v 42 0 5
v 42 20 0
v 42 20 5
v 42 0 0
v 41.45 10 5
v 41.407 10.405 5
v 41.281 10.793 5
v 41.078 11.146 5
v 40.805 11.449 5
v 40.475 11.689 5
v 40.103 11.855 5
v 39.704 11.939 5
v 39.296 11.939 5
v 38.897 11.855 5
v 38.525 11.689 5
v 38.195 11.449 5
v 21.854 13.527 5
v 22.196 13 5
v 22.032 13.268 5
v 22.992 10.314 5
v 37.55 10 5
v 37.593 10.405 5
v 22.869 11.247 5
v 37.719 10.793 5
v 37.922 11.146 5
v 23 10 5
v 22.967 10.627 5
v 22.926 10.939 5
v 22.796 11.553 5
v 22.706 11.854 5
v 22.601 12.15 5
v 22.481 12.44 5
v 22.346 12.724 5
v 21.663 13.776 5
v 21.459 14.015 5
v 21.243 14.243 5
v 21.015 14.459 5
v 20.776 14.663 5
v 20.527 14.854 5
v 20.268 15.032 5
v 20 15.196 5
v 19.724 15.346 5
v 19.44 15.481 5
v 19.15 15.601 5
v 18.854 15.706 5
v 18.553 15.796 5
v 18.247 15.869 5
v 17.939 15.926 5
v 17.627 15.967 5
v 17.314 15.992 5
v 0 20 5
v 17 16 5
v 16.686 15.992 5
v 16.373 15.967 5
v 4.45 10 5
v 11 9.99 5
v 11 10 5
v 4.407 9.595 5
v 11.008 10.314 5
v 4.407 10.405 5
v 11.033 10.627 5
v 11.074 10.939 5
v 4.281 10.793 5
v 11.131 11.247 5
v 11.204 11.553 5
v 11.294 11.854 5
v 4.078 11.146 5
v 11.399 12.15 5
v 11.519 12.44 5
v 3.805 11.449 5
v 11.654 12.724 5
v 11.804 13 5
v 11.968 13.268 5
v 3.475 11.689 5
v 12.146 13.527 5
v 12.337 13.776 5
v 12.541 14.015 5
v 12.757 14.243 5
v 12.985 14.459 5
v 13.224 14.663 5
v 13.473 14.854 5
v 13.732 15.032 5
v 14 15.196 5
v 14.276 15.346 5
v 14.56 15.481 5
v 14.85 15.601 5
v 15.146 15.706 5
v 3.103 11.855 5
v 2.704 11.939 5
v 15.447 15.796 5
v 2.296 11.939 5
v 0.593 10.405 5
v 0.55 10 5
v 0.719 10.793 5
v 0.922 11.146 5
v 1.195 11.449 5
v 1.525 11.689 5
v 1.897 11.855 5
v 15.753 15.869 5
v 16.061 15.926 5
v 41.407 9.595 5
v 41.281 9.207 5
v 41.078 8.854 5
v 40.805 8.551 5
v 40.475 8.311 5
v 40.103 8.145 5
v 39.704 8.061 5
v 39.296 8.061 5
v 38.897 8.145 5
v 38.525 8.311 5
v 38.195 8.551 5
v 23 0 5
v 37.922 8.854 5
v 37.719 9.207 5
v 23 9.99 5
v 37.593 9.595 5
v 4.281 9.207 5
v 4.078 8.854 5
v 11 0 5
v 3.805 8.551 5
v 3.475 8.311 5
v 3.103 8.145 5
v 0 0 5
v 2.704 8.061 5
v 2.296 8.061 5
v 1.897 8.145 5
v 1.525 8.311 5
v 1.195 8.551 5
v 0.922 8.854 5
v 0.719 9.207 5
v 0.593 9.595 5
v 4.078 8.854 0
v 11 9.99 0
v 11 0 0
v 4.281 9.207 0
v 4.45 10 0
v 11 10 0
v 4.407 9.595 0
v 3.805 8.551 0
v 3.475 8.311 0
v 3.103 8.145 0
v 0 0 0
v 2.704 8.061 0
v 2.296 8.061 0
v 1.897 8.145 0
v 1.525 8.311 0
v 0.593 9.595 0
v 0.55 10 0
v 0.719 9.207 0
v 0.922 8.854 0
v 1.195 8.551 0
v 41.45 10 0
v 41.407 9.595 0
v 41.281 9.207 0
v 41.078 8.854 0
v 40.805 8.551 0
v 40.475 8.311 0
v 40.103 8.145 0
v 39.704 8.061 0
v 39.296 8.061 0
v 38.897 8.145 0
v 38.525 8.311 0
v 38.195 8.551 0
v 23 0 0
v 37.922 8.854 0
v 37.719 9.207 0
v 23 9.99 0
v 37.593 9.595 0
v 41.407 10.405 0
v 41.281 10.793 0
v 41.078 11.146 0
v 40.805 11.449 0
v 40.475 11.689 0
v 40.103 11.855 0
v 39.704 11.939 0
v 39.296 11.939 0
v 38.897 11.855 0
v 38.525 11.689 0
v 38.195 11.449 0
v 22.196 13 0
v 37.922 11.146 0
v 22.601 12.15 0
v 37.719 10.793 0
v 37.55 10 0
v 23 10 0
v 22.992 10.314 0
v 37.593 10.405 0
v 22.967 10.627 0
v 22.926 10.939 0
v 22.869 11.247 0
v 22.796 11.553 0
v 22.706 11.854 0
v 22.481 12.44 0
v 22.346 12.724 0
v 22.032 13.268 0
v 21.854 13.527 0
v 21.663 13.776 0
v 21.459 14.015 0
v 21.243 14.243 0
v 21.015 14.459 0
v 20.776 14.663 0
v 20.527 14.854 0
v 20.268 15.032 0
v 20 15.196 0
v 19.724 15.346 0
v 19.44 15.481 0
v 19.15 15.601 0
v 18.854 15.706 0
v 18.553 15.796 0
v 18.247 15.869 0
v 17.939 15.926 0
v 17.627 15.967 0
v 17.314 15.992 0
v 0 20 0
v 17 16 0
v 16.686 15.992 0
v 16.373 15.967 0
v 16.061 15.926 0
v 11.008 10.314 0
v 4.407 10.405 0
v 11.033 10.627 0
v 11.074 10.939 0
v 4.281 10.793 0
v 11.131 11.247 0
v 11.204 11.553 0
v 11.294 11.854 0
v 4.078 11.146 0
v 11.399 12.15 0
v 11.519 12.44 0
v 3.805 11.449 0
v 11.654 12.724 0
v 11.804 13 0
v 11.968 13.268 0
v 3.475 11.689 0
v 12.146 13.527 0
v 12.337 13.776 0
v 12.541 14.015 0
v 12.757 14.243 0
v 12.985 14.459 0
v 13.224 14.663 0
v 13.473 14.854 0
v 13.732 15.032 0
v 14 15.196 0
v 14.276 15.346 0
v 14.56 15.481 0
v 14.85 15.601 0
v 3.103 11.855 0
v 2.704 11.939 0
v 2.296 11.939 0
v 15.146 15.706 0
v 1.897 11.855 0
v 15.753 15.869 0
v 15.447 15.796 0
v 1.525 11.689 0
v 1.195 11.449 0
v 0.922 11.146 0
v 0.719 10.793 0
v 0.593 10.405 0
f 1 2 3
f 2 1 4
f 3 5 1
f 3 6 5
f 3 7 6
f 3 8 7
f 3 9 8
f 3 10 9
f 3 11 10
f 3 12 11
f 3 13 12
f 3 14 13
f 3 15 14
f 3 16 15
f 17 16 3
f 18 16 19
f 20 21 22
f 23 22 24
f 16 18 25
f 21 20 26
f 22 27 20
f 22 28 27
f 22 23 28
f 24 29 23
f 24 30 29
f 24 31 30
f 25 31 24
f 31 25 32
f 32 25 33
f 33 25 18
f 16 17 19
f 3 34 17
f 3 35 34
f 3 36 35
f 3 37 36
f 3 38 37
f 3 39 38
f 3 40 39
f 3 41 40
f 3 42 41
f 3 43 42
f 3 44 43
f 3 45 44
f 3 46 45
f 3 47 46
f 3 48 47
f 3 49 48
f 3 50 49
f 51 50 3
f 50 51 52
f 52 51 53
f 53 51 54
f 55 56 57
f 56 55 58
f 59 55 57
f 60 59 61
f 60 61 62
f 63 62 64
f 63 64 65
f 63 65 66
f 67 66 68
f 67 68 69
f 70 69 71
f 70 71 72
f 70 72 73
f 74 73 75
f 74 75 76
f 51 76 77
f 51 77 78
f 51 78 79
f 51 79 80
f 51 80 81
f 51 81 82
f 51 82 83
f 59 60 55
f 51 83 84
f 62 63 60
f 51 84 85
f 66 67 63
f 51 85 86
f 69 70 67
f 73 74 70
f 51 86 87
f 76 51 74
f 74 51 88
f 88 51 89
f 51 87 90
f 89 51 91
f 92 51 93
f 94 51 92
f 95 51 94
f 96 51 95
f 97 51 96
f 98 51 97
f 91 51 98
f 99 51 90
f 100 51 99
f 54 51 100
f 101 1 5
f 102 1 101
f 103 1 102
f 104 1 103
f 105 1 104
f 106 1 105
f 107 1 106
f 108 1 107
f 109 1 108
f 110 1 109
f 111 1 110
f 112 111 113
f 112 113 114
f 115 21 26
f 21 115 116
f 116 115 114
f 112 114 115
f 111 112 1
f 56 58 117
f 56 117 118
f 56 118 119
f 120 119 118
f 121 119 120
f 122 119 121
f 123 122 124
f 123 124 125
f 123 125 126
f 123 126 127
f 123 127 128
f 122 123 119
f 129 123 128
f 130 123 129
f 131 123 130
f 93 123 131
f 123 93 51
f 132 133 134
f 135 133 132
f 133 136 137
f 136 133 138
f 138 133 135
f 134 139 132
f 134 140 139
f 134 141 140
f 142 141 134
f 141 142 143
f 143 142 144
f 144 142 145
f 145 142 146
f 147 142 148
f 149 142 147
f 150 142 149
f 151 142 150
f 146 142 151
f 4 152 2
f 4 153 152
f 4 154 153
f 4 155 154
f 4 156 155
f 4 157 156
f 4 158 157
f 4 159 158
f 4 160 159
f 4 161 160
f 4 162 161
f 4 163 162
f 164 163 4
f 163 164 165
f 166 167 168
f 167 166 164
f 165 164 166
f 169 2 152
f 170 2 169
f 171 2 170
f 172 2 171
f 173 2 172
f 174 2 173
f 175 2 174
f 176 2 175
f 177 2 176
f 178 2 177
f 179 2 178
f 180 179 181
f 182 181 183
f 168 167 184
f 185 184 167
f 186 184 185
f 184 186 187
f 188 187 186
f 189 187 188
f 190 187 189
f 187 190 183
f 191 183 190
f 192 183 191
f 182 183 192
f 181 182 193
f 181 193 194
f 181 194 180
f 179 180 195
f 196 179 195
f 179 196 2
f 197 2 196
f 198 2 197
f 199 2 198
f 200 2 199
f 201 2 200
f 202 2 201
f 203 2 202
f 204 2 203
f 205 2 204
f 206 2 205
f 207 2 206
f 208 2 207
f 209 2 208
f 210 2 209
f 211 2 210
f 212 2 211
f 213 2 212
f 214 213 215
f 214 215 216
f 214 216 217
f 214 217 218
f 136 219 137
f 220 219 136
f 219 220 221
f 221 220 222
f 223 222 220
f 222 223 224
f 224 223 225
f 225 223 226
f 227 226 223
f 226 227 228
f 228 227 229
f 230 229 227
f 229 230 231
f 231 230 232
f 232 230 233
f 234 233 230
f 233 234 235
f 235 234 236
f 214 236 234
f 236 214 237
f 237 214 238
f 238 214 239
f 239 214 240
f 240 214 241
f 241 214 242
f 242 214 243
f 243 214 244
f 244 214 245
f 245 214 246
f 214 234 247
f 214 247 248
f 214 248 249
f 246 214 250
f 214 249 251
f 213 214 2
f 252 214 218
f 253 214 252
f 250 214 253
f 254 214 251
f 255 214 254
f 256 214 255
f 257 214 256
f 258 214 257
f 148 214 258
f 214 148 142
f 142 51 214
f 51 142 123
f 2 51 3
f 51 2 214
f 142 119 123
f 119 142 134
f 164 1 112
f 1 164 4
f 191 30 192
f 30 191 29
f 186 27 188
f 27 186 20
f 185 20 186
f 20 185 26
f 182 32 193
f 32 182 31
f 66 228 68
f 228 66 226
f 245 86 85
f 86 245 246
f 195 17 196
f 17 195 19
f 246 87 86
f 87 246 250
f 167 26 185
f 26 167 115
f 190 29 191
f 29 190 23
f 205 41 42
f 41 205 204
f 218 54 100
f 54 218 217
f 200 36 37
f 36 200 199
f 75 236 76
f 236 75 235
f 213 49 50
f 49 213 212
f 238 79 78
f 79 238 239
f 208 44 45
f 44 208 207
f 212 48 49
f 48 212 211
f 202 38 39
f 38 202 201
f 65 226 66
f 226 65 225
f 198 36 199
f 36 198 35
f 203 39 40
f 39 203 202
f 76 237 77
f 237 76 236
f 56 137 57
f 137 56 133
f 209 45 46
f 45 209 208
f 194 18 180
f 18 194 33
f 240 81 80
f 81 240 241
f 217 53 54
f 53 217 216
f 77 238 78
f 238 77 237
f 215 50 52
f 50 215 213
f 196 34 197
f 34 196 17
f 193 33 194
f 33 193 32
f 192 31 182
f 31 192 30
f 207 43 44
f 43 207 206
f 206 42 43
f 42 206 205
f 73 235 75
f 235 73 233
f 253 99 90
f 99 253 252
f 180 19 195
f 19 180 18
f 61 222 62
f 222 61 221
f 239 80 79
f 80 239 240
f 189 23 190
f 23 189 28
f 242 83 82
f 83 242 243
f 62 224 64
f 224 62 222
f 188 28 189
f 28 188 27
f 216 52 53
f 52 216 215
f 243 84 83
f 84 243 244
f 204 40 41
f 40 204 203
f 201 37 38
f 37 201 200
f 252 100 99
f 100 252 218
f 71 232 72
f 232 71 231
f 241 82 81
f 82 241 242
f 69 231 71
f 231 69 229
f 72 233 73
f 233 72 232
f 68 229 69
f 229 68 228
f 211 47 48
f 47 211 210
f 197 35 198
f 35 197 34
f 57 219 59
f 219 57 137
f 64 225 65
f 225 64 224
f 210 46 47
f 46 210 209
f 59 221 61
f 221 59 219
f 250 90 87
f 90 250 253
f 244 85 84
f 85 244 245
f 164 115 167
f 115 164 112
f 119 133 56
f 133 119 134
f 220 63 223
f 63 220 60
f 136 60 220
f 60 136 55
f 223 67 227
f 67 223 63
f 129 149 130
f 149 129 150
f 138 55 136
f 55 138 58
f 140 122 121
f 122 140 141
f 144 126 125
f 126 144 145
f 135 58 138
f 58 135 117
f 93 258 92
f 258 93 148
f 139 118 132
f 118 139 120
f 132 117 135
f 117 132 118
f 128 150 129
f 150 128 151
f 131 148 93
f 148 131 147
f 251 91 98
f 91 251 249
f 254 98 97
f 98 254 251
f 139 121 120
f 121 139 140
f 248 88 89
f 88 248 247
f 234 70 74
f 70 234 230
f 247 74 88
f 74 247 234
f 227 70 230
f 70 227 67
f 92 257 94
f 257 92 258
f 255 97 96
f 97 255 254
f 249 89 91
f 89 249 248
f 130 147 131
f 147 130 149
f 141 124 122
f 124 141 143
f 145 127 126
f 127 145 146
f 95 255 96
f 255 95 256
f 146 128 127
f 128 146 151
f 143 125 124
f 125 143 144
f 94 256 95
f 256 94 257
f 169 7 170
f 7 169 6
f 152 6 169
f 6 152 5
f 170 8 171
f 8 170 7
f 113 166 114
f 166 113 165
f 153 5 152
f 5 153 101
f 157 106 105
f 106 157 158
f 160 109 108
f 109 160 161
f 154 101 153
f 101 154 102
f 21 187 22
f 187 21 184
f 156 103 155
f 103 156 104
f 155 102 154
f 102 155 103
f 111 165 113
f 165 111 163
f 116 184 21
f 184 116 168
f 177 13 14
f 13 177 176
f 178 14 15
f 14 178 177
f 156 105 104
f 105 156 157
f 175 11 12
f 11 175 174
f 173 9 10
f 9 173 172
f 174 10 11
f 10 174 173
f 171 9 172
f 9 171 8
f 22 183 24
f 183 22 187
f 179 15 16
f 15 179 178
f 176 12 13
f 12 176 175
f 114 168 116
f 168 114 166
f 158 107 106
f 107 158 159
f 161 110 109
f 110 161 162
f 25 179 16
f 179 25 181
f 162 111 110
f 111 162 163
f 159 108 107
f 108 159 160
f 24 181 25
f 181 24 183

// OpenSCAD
mxy=42; //motor xy
msxy=31; //motor screw xy
msd=3; //motor screw diameter
msh=21; //motor screw height
mhubd=22.5; // motor hub diameter
mhubh=2.7; //motor hub height

ss=1.3; //screw hole slop
stp=0.9; // screw thread percent

gd=8; //gear diameter
gh=15; //gear height this is 14, but adding 1mm for extra space
gad=3; // gear axel diamter
gah=20; // gear axel height
gfo=3;
ty=mxy/2-gd/2; //top y
tshx=mxy/2-mhubd/2; //top spring holder x
tz=12; //top z
tshz=tz-mhubh; //top spring holder z

by=20;
bz=mxy/2-((gd/2)*1.5);
bx=mxy;

hx=20; // handle thickness
hy=70; // handle length
hfd=3;
hgab=2; //handle gear axel border
fhd=3; // filament hole diameter
hz=mxy/2+gad/2+hgab;
springd=8;
springdepth=4;
springoffset=mxy-(mxy-(msxy+msd));

jheadod=16;
jheadsd=12;
jheadh=3.6;
jhsx=2.5;
jhsy=10;
jhsd=3;
jhsh=13;

ftd=4; //filament tube diameter
fmd=10; //filament motor distance(filament center to motor

fthd=7; //filament tube holder diameter

spacerd=10;
spacerh=5;

pt=5; //plate thickness


module extruder_handle(){
    difference(){
        cube([hx,hy,hz]);
       //gear hole
        translate([(hx-gh)/2,mxy/2-gd,mxy/2]){
            rotate([0,90,0]){
                cylinder(d=gd*1.5,h=gh);
            }
        }
        //gear axel hole
        translate([0,mxy/2-gd,mxy/2]){
            rotate([0,90,0]){
                cylinder(d=gad,h=gah,$fn=10);
            }
        }
        // clear handle
        translate([-1,(mxy/2)-(gd-(gad/2))+hgab,mxy/2-mhubd/2]){
            cube([hx+2,hy-(mxy/2)+gd-(gad/2)-hgab,hz-(mxy/2-mhubd/2)]);
        }
        //filament
        translate([hx-(hx/2-gh/2+3),mxy/2-gd/2,-1]){
            cylinder(d=fhd,h=hy+2,$fn=30);
        }
        //screw hole
        translate([-1,mxy/2-msxy/2,mxy/2-msxy/2]){
            rotate([0,90,0]){
                cylinder(d=msd*ss,h=hx+2,$fn=30);
            }
        }
        //spring detent
        translate([hx/2,springoffset,mxy/2-mhubd/2-springdepth]){
            cylinder(d=springd,h=springdepth+1,$fn=30);
        }
    }
}
module extruder_top(){
    difference(){
        translate([0,mxy-ty,0]){
            cube([mxy,ty,tz]);
        }
        //remove hub
        translate([mxy/2,mxy/2,0]){
            cylinder(d=mhubd,h=mhubh,$fn=90);
        }
        //top left screw
        translate([mxy/2-msxy/2,mxy/2+msxy/2,0]){
            cylinder(d=msd*ss,h=msh,$fn=30);
        }
        //top right screw
        translate([mxy/2+msxy/2,mxy/2+msxy/2,0]){
            cylinder(d=msd*ss,h=msh,$fn=30);
        }
        //remove majority of top
        translate([0,mxy-ty,mhubh]){
            cube([mxy-tshx,ty,tz]);
        }
    }
}
module extruder_bottom(){
    difference(){
        cube([bx,by,bz]);
        //remove hub
        translate([mxy/2,mxy/2,bz-mhubh]){
            rotate([90,0,0]){
                cylinder(d=mhubd,h=mhubh,$fn=90);
            }
        }
        //bottom motor left screw
        translate([mxy/2-msxy/2,-1,mxy/2-msxy/2]){
            rotate([-90,0,0]){
                cylinder(d=msd*ss,h=by+2,$fn=30);
            }
        }
        //bottom motor right screw
        translate([mxy/2+msxy/2,-1,mxy/2-msxy/2]){
            rotate([-90,0,0]){
                cylinder(d=msd*ss,h=by+2,$fn=30);
            }
        }
        //remove jhead
        translate([mxy/2-gd/2,fmd,-0.01]){
            cylinder(d=jheadod*1.01,h=jheadh,$fn=120);
        }
        //remove jhead tube holder
        translate([mxy/2-gd/2,fmd,-0.01]){
            cylinder(d=fthd,h=jheadh+3,$fn=120);
        }
        //remove jhead tube
        translate([mxy/2-gd/2,fmd,-0.01]){
            cylinder(d=ftd,h=bz+2,$fn=120);
        }
        //spring detent
        translate([springoffset,by/2-spacerh,bz-springdepth+1]){
            cylinder(d=springd,h=springdepth,$fn=30);
        }
        //bottom jhead left screw
        translate([jhsx,jhsy,-0.01]){
                cylinder(d=jhsd*stp,h=jhsh,$fn=30);
        }
        //bottom jhead right screw
        translate([bx-jhsx,jhsy,-0.01]){
                cylinder(d=jhsd*stp,h=jhsh,$fn=30);
        }
    }
}
module extruder_spacer(){
    difference(){
        cylinder(d=spacerd,h=spacerh,$fn=30);
        cylinder(d=msd*ss,h=spacerh+2,$fn=30);
    }
}
module extruder_jheadplate(){
    difference(){
        //main plate
        cube([bx,by,pt]);
        //jhead
        translate([mxy/2-gd/2,fmd,-0.01]){
            cylinder(d=jheadsd,h=pt+1,$fn=120);
        }
        //slideway
        translate([mxy/2-gd/2-jheadsd/2,-0.01,-0.01]){
            cube([jheadsd,by/2,pt+1]);
        }
        //bottom jhead left screw
        translate([jhsx,jhsy,-0.01]){
                cylinder(d=jhsd*ss,h=jhsh,$fn=30);
        }
        //bottom jhead right screw
        translate([bx-jhsx,jhsy,-0.01]){
                cylinder(d=jhsd*ss,h=jhsh,$fn=30);
        }
    }
}

//extruder_top();
//extruder_handle();
//rotate([90,0,0]){extruder_bottom();}
extruder_jheadplate();
//extruder_spacer();
